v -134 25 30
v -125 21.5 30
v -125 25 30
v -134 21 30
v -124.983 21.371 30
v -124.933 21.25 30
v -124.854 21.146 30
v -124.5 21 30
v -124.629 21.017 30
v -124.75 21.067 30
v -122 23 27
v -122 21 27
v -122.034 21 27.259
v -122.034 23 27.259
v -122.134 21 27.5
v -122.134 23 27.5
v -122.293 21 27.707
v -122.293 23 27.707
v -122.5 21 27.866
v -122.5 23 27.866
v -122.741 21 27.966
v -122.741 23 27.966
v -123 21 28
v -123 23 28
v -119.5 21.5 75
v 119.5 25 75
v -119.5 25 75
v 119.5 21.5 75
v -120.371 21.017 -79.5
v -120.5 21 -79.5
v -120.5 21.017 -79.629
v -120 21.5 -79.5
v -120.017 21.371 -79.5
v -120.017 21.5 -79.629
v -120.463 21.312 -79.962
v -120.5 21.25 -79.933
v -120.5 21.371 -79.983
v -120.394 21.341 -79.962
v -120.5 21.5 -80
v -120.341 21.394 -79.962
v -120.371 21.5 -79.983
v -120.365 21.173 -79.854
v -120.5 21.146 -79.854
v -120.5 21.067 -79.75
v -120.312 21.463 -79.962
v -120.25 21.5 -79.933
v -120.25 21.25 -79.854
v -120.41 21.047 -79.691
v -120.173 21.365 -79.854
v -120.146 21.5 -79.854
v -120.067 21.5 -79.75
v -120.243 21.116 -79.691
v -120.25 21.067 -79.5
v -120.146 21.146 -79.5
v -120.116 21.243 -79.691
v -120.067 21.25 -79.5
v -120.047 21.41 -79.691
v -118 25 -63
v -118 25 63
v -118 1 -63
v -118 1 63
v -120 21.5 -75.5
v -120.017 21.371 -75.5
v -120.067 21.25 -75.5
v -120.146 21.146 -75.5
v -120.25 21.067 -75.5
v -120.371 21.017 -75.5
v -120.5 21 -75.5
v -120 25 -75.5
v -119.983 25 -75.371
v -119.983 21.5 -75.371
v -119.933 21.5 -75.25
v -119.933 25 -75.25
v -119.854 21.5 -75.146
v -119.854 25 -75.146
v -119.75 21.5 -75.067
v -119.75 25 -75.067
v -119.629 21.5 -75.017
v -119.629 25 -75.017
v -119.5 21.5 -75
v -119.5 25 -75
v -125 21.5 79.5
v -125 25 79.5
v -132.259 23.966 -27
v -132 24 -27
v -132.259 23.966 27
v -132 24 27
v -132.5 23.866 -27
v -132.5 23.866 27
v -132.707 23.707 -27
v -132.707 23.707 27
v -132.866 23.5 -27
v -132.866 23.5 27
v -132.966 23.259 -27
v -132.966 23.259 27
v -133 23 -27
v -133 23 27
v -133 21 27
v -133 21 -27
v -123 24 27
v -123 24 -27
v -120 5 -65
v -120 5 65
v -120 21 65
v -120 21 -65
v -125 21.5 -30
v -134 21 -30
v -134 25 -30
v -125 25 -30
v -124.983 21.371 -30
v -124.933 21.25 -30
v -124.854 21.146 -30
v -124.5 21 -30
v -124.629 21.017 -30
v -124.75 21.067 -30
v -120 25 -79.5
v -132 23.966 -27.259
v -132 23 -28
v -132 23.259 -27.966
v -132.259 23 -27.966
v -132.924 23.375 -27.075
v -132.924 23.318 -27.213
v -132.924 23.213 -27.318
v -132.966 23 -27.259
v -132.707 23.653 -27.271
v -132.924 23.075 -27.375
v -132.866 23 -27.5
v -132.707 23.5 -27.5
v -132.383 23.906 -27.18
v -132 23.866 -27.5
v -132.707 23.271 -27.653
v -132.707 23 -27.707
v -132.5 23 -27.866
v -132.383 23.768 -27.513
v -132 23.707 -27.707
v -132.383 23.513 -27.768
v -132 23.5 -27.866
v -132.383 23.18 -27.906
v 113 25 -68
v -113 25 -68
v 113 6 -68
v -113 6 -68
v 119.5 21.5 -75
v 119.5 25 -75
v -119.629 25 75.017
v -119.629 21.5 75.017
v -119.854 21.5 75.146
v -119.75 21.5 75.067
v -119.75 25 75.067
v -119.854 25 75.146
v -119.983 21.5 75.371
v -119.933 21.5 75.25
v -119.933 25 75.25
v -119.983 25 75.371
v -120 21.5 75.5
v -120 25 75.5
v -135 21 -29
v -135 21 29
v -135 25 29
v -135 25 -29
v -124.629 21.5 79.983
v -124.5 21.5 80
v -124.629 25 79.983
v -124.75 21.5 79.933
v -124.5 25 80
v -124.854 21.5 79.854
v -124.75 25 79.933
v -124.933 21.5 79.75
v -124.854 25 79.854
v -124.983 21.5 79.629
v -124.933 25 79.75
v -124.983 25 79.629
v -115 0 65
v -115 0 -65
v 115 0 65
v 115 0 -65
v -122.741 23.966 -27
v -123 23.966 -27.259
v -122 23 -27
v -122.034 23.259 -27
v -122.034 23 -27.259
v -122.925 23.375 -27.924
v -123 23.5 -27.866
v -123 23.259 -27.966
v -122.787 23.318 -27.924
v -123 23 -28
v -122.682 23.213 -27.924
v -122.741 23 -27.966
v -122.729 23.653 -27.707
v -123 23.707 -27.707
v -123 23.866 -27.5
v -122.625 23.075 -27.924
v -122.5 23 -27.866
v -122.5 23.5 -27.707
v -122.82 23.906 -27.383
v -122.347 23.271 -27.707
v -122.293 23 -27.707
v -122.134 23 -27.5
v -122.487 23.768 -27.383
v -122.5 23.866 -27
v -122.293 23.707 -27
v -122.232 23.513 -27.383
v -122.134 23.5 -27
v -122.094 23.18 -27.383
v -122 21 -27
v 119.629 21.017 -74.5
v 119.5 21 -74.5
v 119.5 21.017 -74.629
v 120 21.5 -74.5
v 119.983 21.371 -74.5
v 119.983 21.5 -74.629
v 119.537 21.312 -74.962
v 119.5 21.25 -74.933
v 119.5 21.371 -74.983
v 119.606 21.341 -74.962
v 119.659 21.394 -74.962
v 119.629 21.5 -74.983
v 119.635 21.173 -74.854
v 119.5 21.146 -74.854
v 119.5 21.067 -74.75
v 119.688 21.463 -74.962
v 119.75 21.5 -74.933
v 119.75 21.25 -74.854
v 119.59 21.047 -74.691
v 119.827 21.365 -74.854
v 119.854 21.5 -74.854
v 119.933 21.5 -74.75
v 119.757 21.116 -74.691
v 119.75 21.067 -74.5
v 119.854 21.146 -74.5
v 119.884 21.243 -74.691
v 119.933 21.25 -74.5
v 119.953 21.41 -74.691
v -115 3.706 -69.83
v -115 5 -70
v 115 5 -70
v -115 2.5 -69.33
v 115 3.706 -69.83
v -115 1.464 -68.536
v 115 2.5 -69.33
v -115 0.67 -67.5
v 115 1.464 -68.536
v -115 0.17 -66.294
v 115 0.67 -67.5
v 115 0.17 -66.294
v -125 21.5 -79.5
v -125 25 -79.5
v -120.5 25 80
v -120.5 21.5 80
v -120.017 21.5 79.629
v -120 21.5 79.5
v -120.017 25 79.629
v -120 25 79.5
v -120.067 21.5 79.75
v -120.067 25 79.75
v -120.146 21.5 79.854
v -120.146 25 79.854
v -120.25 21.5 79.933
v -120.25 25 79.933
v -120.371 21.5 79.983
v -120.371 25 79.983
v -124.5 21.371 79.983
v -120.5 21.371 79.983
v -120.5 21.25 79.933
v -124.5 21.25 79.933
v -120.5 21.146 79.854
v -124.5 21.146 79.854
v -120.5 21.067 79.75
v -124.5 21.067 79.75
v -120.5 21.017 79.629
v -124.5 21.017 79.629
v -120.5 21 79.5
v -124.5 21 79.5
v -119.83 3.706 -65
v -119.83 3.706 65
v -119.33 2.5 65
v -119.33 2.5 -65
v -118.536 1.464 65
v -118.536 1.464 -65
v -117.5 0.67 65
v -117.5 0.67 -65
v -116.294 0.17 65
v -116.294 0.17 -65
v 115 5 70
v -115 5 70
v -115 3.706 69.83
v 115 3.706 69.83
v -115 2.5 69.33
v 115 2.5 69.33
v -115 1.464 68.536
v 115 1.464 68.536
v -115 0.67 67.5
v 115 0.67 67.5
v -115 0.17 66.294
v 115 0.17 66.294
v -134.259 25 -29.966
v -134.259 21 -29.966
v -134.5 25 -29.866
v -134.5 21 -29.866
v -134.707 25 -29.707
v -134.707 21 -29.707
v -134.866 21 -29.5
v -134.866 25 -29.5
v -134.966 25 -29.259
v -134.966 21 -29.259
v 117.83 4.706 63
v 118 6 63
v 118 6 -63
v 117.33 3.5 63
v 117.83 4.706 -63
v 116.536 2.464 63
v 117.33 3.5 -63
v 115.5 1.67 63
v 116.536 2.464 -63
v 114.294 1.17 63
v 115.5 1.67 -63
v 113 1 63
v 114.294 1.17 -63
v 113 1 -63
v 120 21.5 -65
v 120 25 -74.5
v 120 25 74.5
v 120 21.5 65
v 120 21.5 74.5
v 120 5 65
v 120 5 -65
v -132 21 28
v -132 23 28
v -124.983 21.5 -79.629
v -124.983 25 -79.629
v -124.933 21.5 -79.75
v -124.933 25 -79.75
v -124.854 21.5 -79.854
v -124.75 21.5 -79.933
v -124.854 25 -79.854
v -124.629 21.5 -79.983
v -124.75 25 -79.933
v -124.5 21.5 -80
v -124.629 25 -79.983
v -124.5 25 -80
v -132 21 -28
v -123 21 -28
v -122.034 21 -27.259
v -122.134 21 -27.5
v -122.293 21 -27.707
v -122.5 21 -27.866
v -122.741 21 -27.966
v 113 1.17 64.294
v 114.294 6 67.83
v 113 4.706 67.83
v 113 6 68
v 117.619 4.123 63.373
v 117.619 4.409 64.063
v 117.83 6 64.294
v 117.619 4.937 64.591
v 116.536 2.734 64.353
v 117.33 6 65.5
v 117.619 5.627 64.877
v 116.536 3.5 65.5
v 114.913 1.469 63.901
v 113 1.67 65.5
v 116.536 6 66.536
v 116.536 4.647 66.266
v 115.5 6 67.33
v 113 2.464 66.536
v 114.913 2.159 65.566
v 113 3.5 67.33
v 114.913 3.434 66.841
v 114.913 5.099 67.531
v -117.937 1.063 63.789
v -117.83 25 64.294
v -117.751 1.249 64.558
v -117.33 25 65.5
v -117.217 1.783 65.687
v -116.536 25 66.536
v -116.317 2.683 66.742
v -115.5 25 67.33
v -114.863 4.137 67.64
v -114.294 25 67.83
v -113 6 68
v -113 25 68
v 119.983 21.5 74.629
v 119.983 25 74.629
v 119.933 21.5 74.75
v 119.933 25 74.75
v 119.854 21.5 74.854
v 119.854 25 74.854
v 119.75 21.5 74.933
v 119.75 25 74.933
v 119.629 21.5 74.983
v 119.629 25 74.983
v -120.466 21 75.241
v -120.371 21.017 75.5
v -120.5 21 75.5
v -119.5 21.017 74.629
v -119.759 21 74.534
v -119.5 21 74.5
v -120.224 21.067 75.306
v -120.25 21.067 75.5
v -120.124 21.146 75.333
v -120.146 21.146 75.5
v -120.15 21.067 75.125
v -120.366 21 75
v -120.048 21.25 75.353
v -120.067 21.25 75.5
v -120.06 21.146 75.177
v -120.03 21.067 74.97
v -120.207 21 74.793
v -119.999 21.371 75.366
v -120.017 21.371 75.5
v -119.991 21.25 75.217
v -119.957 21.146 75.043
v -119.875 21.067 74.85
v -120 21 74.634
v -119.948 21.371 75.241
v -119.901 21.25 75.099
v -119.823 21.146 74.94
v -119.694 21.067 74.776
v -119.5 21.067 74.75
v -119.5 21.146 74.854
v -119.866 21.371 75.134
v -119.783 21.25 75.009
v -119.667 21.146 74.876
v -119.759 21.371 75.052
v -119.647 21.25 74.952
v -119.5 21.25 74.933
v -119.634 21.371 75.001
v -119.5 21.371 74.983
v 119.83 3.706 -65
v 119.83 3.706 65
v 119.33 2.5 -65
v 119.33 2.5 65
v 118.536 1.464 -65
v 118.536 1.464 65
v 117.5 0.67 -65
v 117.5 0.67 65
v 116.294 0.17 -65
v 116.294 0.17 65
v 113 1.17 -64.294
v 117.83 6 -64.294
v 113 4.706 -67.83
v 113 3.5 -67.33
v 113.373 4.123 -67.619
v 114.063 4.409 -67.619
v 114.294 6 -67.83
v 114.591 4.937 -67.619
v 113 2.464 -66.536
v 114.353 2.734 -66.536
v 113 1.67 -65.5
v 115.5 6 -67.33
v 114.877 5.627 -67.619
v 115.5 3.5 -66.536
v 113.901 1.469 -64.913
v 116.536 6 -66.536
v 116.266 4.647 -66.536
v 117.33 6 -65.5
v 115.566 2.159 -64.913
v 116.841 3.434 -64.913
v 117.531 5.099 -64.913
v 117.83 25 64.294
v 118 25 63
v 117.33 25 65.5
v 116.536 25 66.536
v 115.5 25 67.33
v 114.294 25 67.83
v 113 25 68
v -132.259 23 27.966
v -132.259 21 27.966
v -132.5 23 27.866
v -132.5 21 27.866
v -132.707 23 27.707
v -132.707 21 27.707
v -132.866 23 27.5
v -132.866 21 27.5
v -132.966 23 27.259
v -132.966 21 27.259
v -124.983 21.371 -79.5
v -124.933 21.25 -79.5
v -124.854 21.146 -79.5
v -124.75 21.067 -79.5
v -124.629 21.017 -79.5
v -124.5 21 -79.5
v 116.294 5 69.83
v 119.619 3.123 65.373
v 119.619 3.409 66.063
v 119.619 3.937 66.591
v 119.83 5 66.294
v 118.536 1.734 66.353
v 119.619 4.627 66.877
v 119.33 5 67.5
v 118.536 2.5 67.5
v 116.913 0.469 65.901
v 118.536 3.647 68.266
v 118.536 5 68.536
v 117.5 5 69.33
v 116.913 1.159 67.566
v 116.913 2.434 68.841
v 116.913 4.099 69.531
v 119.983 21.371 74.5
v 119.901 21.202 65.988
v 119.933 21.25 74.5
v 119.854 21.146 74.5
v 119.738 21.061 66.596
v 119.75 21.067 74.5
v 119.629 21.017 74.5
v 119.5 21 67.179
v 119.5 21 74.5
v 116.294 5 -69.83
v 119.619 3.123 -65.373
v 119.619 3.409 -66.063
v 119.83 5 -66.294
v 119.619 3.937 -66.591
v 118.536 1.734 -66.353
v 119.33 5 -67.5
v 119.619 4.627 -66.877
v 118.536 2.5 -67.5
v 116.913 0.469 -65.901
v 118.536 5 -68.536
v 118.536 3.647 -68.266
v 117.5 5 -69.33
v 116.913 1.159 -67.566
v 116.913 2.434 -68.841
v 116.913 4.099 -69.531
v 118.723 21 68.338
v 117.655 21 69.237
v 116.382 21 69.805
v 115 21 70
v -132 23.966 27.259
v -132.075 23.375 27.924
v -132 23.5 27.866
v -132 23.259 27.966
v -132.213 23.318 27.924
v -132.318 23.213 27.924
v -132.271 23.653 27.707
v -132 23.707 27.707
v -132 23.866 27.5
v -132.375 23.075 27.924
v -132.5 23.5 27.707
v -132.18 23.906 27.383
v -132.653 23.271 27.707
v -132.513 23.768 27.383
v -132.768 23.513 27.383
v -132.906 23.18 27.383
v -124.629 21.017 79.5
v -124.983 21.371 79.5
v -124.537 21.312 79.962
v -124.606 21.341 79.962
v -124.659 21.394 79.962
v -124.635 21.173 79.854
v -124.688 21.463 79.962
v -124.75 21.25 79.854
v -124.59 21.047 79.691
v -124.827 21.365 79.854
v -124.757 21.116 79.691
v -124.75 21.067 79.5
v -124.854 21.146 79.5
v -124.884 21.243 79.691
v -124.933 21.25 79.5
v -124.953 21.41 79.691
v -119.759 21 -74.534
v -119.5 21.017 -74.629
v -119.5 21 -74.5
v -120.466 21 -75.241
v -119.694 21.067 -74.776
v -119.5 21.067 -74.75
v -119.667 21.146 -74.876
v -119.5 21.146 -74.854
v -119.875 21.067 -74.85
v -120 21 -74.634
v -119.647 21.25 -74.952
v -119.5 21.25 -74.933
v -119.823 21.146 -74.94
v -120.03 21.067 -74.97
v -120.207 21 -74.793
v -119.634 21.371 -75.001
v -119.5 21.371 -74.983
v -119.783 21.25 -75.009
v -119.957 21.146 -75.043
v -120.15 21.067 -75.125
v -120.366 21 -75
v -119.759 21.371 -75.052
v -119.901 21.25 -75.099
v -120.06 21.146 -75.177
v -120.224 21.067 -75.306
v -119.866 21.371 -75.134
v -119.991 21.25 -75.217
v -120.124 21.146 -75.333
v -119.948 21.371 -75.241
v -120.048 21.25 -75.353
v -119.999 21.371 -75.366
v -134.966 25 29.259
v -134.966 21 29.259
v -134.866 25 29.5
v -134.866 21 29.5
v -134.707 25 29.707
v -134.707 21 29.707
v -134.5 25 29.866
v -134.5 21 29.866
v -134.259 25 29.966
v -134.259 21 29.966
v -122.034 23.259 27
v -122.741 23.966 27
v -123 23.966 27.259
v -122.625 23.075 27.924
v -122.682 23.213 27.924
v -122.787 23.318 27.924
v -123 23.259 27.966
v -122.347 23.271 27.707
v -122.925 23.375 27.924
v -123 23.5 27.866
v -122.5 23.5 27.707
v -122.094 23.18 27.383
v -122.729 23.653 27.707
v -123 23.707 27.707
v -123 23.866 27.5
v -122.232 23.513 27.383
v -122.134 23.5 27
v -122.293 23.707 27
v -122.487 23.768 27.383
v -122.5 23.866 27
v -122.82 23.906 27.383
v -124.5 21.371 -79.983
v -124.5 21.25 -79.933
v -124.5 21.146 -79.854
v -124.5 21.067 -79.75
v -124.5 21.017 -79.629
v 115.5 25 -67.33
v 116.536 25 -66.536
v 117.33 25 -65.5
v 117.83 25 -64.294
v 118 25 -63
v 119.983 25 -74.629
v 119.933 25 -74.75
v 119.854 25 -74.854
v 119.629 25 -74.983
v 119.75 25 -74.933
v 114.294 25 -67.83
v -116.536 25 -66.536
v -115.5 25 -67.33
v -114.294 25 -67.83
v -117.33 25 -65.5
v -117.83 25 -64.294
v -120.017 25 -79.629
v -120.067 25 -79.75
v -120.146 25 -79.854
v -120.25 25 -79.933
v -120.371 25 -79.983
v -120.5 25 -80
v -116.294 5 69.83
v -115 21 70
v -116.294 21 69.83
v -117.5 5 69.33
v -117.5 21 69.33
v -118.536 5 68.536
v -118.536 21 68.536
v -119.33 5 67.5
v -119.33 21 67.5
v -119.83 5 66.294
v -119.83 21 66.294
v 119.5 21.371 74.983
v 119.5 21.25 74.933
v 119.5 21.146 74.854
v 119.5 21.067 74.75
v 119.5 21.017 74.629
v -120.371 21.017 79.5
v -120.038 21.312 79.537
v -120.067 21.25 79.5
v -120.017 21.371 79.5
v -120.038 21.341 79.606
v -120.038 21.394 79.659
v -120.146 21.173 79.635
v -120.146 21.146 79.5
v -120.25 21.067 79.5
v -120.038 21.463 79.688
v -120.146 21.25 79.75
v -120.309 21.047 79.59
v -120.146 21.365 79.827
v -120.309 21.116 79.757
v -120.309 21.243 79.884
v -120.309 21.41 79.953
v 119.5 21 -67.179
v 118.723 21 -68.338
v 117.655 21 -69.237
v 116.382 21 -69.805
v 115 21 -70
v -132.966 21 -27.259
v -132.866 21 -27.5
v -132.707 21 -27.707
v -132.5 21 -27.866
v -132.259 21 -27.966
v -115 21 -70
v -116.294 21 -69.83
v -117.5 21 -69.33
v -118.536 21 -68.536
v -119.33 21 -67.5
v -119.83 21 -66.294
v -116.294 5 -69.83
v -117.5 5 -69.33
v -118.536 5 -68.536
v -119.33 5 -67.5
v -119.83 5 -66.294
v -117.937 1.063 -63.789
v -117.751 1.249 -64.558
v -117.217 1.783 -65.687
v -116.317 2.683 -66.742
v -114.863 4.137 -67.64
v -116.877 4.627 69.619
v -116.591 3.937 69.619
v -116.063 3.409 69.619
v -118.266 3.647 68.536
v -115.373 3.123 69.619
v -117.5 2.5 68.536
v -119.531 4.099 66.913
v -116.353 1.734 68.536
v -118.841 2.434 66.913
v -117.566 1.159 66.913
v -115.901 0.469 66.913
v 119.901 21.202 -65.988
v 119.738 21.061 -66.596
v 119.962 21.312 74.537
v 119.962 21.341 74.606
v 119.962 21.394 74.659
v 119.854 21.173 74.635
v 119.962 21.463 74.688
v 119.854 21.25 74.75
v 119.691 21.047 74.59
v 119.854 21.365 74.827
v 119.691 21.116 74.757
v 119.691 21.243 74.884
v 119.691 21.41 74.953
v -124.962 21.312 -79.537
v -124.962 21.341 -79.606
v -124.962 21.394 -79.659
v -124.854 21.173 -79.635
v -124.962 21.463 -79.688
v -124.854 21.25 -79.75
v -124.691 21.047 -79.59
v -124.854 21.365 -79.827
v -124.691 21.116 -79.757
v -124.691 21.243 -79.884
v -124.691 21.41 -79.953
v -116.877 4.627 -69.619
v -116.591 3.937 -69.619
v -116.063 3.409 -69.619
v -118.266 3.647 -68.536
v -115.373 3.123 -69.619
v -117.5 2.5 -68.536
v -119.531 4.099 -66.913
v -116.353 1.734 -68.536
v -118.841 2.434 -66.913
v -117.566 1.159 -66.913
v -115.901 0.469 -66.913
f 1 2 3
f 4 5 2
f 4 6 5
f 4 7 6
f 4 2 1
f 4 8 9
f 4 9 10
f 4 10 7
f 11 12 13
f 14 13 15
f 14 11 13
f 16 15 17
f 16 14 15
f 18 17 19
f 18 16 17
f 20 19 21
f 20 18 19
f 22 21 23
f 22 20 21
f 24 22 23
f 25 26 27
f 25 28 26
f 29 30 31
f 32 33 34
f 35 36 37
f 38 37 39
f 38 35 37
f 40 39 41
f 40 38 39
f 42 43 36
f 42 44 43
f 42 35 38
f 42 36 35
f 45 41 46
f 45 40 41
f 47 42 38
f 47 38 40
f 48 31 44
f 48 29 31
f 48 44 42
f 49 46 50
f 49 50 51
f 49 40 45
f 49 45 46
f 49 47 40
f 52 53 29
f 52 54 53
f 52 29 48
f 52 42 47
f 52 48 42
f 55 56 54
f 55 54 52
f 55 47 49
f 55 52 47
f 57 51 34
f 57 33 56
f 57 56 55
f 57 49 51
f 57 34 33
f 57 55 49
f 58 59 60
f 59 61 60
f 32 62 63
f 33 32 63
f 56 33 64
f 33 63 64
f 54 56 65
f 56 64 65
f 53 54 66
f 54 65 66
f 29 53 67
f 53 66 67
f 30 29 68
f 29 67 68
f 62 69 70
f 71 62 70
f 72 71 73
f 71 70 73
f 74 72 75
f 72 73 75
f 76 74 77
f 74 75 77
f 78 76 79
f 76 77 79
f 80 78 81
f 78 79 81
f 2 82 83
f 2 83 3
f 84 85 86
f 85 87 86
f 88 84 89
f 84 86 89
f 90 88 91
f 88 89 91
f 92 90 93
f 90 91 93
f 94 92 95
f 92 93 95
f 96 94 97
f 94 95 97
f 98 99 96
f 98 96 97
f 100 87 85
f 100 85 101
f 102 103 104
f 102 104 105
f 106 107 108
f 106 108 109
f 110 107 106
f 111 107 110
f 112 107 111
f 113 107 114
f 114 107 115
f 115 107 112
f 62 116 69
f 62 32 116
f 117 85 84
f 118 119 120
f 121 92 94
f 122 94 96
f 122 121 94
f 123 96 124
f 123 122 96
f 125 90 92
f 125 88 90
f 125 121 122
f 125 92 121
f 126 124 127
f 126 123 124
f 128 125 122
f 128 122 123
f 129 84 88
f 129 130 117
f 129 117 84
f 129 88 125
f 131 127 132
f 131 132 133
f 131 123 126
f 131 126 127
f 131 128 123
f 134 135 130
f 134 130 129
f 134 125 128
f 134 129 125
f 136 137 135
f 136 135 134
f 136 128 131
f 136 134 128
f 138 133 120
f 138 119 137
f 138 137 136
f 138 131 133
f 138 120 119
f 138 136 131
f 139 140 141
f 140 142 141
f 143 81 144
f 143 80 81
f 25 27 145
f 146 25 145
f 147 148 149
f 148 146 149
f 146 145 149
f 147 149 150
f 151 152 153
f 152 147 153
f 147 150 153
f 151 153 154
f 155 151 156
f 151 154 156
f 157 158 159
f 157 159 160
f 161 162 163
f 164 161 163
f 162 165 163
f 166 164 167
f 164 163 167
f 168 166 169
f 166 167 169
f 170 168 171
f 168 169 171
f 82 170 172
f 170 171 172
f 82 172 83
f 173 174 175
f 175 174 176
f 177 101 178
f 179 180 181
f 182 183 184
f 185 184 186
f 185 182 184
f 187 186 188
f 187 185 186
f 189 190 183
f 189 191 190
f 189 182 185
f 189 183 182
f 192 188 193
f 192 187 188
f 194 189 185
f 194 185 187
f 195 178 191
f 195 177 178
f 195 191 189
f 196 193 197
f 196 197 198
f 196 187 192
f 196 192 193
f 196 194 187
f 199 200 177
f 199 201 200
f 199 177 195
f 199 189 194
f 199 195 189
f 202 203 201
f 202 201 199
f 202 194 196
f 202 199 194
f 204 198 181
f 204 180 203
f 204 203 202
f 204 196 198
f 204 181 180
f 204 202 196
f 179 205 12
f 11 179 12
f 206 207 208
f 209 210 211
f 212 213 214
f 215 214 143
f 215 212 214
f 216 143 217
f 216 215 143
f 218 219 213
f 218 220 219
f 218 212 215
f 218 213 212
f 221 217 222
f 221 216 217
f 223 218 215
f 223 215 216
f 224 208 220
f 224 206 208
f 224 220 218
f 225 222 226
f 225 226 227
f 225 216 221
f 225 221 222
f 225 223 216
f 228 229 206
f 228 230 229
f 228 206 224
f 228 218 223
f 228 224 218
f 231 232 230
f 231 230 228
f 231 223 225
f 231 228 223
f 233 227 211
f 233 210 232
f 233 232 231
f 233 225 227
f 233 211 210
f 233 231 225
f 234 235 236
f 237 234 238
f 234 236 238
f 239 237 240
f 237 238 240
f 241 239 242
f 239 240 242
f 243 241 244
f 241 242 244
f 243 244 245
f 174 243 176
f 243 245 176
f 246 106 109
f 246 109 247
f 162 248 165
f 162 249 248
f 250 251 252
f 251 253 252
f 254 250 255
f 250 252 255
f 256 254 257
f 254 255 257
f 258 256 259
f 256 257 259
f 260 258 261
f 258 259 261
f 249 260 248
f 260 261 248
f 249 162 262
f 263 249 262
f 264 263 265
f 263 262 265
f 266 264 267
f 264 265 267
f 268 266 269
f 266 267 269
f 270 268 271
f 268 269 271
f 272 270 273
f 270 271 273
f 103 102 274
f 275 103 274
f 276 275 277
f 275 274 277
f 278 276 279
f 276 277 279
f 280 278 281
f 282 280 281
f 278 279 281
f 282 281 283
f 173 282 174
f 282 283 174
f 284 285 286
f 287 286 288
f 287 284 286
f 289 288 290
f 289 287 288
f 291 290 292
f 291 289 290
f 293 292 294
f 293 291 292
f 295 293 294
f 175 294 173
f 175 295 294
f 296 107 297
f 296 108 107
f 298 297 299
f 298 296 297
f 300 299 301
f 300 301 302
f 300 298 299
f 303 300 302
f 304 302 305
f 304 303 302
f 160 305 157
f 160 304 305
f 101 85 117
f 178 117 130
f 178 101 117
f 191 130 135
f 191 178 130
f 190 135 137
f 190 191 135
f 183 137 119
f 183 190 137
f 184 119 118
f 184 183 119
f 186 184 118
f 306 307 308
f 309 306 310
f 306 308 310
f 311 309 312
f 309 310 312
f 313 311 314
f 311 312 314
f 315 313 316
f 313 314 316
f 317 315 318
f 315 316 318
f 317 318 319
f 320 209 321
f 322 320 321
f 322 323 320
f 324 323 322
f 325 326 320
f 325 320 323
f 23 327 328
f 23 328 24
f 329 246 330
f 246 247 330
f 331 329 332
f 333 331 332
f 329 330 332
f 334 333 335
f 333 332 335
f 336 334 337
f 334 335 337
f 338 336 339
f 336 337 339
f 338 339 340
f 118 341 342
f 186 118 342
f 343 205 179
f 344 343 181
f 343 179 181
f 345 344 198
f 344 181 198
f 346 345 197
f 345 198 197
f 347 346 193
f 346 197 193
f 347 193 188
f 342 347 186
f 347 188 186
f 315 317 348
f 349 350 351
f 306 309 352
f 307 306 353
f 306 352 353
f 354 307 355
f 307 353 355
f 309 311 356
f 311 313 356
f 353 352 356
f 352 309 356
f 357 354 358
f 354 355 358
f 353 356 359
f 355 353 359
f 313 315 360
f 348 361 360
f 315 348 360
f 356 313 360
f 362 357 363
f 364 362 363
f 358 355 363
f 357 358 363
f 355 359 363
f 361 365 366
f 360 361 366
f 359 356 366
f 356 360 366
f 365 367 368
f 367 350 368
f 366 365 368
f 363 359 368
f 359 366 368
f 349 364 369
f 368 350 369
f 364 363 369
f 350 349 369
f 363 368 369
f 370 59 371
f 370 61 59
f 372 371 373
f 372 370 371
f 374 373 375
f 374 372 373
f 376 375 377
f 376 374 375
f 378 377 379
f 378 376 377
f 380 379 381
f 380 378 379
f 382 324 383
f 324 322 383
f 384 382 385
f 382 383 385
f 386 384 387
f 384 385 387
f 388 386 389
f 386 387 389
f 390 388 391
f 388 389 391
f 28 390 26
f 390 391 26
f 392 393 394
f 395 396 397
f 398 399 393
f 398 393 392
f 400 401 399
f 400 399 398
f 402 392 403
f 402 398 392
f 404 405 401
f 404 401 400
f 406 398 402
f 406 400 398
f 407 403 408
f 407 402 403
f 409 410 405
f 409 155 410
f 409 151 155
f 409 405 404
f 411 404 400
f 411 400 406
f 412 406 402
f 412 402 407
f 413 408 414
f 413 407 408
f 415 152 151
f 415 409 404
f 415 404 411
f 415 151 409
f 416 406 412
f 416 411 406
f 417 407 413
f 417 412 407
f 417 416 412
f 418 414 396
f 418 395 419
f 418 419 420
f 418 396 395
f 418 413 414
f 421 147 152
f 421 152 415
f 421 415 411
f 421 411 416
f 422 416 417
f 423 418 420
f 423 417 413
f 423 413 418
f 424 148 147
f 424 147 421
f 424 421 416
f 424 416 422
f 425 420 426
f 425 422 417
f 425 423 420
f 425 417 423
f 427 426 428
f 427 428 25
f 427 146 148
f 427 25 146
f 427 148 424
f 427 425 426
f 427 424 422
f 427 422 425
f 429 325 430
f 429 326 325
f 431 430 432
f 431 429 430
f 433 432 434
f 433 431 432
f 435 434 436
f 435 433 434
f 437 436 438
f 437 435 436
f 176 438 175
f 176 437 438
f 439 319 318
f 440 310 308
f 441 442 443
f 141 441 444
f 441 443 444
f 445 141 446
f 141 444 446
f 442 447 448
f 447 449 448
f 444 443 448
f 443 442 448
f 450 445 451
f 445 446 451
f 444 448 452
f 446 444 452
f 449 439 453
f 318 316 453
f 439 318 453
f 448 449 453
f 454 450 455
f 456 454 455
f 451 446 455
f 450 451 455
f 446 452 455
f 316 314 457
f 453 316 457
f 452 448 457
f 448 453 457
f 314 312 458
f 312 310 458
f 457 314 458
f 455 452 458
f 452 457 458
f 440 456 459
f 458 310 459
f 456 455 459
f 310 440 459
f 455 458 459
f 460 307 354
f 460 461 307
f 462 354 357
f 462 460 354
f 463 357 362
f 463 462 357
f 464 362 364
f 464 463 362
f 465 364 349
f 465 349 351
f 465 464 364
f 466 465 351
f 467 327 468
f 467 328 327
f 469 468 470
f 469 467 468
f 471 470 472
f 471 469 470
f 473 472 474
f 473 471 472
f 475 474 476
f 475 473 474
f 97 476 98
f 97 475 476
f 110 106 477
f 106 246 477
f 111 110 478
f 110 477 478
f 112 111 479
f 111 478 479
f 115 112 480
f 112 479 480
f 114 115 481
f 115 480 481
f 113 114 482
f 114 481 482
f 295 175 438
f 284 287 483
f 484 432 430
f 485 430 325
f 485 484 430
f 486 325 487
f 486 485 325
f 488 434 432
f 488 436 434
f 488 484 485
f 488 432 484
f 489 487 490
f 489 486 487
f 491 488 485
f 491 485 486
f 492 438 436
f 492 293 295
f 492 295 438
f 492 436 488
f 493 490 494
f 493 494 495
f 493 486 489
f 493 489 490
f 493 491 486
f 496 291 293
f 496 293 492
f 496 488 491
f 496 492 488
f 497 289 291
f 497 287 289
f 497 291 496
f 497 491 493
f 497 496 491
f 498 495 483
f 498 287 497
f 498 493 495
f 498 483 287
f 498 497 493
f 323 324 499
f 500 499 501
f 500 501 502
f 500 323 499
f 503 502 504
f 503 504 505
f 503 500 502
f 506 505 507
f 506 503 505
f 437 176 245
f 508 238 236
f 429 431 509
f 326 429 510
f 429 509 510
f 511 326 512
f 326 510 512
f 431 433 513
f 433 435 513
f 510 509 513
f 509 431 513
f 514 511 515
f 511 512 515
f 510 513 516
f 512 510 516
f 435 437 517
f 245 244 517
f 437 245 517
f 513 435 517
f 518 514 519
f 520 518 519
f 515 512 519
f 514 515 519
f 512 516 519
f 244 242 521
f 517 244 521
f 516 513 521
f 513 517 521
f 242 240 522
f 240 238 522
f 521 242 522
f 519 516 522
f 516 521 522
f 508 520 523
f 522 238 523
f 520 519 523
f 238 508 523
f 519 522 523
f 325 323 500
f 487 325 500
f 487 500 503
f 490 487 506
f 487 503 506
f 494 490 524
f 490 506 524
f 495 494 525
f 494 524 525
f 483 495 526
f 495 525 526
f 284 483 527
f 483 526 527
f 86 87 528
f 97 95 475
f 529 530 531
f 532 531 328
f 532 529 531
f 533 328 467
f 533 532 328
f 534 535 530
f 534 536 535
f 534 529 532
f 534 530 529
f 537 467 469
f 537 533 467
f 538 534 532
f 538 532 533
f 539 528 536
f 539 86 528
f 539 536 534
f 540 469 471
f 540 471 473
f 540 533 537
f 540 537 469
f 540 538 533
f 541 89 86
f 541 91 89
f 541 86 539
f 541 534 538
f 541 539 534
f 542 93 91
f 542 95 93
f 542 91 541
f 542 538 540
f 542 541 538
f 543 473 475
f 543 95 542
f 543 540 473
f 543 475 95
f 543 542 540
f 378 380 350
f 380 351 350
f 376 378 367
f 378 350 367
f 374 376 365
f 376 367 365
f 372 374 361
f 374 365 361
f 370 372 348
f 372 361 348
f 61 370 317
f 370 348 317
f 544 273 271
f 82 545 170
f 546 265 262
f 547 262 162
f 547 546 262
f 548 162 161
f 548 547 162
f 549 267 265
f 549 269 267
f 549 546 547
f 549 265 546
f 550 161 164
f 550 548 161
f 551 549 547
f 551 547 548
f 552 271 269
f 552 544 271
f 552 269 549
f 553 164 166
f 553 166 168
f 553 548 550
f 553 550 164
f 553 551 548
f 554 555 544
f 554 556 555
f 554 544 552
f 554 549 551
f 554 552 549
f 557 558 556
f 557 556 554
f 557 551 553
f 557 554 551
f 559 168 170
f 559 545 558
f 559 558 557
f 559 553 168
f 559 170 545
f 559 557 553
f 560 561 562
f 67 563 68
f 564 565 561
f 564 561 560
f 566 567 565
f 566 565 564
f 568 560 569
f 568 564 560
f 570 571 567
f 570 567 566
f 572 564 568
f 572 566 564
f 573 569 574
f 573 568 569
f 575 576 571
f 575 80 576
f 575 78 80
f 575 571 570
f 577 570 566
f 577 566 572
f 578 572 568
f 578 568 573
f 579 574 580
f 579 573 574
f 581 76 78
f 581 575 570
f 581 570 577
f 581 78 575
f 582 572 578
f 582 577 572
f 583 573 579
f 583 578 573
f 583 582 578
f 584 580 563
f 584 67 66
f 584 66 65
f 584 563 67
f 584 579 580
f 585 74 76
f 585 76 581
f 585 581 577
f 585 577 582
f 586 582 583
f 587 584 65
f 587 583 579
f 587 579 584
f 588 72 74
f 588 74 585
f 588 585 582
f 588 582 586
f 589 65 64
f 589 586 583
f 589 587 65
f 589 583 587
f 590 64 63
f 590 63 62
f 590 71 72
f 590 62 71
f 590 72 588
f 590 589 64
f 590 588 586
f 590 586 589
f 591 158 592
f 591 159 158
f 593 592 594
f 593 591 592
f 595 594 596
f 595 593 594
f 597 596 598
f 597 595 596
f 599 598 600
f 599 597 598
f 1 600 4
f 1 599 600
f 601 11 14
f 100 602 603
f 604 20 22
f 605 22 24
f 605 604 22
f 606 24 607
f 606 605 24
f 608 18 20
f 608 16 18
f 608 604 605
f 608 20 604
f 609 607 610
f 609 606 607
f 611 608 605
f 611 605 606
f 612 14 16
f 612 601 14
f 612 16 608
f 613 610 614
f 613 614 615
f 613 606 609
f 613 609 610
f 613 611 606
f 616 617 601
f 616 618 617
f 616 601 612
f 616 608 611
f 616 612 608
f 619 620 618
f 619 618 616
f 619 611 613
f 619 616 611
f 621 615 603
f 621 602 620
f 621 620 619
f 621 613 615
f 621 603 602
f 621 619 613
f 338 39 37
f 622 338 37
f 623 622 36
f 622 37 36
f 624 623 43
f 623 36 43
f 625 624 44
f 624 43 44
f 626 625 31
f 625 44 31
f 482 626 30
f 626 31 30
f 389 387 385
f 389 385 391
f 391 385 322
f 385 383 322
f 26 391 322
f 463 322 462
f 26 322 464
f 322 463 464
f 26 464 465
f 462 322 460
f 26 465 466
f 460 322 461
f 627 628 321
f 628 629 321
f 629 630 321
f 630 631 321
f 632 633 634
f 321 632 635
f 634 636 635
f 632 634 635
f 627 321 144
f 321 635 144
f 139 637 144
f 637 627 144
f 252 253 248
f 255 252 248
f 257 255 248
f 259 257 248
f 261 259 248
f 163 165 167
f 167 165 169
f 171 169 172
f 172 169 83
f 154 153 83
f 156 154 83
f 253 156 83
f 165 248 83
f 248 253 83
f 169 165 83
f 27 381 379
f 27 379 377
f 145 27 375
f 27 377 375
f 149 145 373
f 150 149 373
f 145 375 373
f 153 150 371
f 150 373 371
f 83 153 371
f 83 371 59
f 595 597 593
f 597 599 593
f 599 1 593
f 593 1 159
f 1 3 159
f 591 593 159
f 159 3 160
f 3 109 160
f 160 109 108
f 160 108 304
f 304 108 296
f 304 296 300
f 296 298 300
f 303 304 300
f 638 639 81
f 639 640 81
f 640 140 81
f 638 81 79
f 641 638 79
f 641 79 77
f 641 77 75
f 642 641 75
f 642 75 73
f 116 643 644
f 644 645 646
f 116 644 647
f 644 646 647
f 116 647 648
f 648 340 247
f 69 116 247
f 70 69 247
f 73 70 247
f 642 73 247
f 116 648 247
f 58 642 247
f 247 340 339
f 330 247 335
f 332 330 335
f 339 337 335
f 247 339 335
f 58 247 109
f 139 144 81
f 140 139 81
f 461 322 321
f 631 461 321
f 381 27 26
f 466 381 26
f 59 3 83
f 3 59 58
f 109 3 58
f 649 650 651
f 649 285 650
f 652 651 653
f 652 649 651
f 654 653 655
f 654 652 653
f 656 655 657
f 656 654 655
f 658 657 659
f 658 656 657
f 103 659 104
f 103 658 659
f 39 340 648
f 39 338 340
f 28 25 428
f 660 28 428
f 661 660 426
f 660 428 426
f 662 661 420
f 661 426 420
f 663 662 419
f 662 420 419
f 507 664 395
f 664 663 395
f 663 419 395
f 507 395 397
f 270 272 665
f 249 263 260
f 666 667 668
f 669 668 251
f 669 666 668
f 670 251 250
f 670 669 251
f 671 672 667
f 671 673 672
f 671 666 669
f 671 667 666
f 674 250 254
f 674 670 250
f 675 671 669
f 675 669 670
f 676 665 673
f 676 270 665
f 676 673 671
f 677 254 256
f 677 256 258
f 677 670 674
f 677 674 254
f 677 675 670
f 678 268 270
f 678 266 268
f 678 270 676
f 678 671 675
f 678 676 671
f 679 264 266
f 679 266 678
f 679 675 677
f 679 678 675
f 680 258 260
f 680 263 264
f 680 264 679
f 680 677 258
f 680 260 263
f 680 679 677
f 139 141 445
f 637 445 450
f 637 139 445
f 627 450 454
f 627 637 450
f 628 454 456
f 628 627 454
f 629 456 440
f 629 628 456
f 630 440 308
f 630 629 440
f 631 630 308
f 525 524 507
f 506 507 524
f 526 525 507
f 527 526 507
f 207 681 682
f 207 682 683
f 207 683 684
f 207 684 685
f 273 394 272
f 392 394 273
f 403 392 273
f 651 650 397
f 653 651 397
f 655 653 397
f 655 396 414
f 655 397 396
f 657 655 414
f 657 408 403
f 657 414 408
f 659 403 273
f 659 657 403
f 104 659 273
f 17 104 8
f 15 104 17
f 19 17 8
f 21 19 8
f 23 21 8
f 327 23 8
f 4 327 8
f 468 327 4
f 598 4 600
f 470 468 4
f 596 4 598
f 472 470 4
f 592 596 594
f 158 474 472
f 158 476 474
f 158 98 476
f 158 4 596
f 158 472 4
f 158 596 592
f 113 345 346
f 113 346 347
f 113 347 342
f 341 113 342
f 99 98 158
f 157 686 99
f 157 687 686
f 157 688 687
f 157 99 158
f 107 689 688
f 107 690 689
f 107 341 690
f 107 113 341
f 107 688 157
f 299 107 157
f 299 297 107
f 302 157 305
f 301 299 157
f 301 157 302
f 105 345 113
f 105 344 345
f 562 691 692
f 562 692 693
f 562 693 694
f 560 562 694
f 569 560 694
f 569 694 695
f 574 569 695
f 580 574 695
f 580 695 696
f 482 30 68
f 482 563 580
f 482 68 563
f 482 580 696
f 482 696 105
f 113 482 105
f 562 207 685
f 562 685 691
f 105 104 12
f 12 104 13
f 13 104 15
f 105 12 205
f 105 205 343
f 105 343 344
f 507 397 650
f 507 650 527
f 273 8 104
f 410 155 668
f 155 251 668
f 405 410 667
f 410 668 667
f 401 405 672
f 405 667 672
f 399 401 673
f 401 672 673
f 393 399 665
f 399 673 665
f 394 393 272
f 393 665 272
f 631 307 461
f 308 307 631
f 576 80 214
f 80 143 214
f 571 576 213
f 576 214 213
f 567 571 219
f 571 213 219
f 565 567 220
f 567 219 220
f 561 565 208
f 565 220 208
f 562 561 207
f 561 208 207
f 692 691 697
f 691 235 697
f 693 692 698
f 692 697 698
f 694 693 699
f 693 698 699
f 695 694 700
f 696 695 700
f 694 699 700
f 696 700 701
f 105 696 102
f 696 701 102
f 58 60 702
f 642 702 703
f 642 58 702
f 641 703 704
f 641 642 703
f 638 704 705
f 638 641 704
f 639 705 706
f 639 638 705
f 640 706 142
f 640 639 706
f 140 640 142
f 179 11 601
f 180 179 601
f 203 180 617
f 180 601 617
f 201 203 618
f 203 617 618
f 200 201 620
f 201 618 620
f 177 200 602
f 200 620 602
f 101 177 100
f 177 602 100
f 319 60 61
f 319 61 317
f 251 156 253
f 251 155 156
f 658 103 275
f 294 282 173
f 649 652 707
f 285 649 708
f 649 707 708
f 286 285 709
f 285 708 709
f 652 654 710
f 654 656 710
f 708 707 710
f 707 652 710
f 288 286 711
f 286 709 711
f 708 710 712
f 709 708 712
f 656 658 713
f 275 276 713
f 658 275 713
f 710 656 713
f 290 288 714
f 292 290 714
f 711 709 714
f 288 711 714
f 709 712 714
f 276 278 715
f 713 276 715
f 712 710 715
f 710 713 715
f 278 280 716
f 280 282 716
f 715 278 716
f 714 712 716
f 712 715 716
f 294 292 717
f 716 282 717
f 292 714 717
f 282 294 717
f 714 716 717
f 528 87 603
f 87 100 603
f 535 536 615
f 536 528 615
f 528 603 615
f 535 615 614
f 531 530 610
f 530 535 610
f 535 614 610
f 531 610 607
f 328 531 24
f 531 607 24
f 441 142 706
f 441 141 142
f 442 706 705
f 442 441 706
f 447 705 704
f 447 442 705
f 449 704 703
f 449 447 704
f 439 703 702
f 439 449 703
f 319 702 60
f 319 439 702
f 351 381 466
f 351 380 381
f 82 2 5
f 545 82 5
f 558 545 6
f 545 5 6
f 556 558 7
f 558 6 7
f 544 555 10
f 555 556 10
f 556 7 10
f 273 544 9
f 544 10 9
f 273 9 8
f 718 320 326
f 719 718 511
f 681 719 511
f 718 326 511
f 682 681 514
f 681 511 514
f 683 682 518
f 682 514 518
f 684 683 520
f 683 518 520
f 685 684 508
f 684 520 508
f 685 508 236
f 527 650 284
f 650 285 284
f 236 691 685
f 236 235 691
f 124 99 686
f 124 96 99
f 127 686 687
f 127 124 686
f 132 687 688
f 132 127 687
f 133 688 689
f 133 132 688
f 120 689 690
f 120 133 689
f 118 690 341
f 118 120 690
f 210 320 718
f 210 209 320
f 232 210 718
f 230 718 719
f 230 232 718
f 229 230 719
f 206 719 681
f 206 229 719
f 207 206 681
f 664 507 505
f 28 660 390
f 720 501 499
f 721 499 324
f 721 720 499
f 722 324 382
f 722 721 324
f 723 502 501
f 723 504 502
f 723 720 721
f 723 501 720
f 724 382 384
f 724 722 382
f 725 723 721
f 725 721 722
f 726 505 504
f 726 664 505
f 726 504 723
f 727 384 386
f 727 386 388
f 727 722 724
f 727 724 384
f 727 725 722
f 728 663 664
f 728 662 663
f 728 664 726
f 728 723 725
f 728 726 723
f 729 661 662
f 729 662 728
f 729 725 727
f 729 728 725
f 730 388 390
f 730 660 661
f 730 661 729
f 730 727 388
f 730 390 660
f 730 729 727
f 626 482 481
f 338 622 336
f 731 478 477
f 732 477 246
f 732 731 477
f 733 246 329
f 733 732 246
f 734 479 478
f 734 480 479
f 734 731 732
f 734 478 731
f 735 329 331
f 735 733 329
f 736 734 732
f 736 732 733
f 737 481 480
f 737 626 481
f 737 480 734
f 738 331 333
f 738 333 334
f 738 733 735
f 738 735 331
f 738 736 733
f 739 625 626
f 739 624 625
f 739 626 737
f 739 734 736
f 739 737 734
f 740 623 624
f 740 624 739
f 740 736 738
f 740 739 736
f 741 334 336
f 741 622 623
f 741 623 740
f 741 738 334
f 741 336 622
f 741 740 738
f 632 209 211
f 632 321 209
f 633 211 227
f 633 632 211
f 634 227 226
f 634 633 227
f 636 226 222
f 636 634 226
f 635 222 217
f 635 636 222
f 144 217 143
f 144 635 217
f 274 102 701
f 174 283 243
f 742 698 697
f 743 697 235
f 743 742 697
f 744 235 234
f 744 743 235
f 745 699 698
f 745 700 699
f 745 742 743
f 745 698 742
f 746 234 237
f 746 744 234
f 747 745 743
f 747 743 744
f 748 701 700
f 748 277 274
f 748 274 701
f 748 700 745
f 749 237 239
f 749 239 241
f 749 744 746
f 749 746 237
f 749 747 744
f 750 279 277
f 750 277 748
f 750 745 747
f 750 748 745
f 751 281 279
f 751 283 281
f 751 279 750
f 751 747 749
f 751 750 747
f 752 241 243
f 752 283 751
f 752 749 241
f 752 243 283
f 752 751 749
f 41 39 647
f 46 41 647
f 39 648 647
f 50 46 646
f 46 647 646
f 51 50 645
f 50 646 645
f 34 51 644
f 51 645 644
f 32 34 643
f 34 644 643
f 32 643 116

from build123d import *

# Parameters (mm, degrees)
SKETCH2_W           = 240
SKETCH2_H           = 140
BOSS_EXTRUDE1_DEPTH = 1
SKETCH3_W           = 240
SKETCH3_H           = 140
SKETCH3_W_2         = 236
SKETCH3_H_2         = 136
BOSS_EXTRUDE2_DEPTH = 20
SKETCH4_W           = 236
SKETCH4_H           = 136
BOSS_EXTRUDE3_DEPTH = 4
SKETCH6_W           = 11
SKETCH6_H           = 56
CUT_EXTRUDE2_DEPTH  = 3
FILLET1_R           = 5
FILLET2_R           = 5
FILLET3_R           = 0.5
FILLET4_R           = 1


with BuildPart() as part:
    # Sketch2 → Boss-Extrude1 (new body)
    with BuildSketch(Plane(origin=(0, 0, 0), x_dir=(1, 0, 0), z_dir=(0, 1, 0))):
        Rectangle(SKETCH2_W, SKETCH2_H)
    extrude(amount=BOSS_EXTRUDE1_DEPTH)

    # Sketch3 → Boss-Extrude2 (add)
    with BuildSketch(Plane(origin=(0, 1, 0), x_dir=(1, 0, 0), z_dir=(0, 1, 0))):
        Rectangle(SKETCH3_W, SKETCH3_H)
        Rectangle(SKETCH3_W_2, SKETCH3_H_2, mode=Mode.SUBTRACT)
    extrude(amount=BOSS_EXTRUDE2_DEPTH)

    # Sketch4 → Boss-Extrude3 (add)
    with BuildSketch(Plane(origin=(0, 21, 0), x_dir=(1, 0, 0), z_dir=(0, 1, 0))):
        Polygon((-125, 80), (-120, 80), (-120, 75), (120, 75), (120, -75), (-120, -75), (-120, -80), (-125, -80), (-125, -30), (-135, -30), (-135, 30), (-125, 30), align=None)
        Rectangle(SKETCH4_W, SKETCH4_H, mode=Mode.SUBTRACT)
    extrude(amount=BOSS_EXTRUDE3_DEPTH)

    # Sketch6 → Cut-Extrude2 (cut)
    with BuildSketch(Plane.XZ.offset(-21)):
        with Locations((-127.5, 0)):
            Rectangle(SKETCH6_W, SKETCH6_H)
    extrude(amount=-CUT_EXTRUDE2_DEPTH, mode=Mode.SUBTRACT)

    # Fillet1
    fillet1_edges = [part.edges().sort_by_distance(p)[0] for p in [
        (0, 1, 68),
        (118, 1, 0),
        (0, 1, -68),
        (-118, 13, 68),
        (118, 13, 68),
        (118, 13, -68),
        (-118, 13, -68),
        (-120, 0, 0),
    ]]
    fillet(fillet1_edges, radius=FILLET1_R)

    # Fillet2
    fillet2_edges = [part.edges().sort_by_distance(p)[0] for p in [
        (2.5, 0, 70),
        (-118.535533906, 1.464466094, 70),
        (-118.535533906, 1.464466094, -70),
        (2.5, 0, -70),
        (120, 0, 0),
        (120, 10.5, 70),
        (-120, 13, 70),
        (-120, 13, -70),
        (120, 10.5, -70),
    ]]
    fillet(fillet2_edges, radius=FILLET2_R)

    # Fillet3
    fillet3_edges = [part.edges().sort_by_distance(p)[0] for p in [
        (-125, 21, 55),
        (-122.5, 21, 80),
        (-125, 23, 80),
        (-120, 21, 77.5),
        (-120, 23, 80),
        (0, 21, 75),
        (-120, 23, 75),
        (120, 21, 67.5),
        (120, 21, -67.5),
        (120, 23, 75),
        (0, 21, -75),
        (120, 23, -75),
        (-120, 21, -77.5),
        (-120, 23, -75),
        (-122.5, 21, -80),
        (-120, 23, -80),
        (-125, 21, -55),
        (-125, 23, -80),
    ]]
    fillet(fillet3_edges, radius=FILLET3_R)

    # Fillet4
    fillet4_edges = [part.edges().sort_by_distance(p)[0] for p in [
        (-135, 23, -30),
        (-135, 23, 30),
        (-122, 24, 0),
        (-122, 22.5, 28),
        (-127.5, 24, -28),
        (-122, 22.5, -28),
        (-133, 24, 0),
        (-133, 22.5, -28),
        (-127.5, 24, 28),
        (-133, 22.5, 28),
    ]]
    fillet(fillet4_edges, radius=FILLET4_R)


solid = part.part
